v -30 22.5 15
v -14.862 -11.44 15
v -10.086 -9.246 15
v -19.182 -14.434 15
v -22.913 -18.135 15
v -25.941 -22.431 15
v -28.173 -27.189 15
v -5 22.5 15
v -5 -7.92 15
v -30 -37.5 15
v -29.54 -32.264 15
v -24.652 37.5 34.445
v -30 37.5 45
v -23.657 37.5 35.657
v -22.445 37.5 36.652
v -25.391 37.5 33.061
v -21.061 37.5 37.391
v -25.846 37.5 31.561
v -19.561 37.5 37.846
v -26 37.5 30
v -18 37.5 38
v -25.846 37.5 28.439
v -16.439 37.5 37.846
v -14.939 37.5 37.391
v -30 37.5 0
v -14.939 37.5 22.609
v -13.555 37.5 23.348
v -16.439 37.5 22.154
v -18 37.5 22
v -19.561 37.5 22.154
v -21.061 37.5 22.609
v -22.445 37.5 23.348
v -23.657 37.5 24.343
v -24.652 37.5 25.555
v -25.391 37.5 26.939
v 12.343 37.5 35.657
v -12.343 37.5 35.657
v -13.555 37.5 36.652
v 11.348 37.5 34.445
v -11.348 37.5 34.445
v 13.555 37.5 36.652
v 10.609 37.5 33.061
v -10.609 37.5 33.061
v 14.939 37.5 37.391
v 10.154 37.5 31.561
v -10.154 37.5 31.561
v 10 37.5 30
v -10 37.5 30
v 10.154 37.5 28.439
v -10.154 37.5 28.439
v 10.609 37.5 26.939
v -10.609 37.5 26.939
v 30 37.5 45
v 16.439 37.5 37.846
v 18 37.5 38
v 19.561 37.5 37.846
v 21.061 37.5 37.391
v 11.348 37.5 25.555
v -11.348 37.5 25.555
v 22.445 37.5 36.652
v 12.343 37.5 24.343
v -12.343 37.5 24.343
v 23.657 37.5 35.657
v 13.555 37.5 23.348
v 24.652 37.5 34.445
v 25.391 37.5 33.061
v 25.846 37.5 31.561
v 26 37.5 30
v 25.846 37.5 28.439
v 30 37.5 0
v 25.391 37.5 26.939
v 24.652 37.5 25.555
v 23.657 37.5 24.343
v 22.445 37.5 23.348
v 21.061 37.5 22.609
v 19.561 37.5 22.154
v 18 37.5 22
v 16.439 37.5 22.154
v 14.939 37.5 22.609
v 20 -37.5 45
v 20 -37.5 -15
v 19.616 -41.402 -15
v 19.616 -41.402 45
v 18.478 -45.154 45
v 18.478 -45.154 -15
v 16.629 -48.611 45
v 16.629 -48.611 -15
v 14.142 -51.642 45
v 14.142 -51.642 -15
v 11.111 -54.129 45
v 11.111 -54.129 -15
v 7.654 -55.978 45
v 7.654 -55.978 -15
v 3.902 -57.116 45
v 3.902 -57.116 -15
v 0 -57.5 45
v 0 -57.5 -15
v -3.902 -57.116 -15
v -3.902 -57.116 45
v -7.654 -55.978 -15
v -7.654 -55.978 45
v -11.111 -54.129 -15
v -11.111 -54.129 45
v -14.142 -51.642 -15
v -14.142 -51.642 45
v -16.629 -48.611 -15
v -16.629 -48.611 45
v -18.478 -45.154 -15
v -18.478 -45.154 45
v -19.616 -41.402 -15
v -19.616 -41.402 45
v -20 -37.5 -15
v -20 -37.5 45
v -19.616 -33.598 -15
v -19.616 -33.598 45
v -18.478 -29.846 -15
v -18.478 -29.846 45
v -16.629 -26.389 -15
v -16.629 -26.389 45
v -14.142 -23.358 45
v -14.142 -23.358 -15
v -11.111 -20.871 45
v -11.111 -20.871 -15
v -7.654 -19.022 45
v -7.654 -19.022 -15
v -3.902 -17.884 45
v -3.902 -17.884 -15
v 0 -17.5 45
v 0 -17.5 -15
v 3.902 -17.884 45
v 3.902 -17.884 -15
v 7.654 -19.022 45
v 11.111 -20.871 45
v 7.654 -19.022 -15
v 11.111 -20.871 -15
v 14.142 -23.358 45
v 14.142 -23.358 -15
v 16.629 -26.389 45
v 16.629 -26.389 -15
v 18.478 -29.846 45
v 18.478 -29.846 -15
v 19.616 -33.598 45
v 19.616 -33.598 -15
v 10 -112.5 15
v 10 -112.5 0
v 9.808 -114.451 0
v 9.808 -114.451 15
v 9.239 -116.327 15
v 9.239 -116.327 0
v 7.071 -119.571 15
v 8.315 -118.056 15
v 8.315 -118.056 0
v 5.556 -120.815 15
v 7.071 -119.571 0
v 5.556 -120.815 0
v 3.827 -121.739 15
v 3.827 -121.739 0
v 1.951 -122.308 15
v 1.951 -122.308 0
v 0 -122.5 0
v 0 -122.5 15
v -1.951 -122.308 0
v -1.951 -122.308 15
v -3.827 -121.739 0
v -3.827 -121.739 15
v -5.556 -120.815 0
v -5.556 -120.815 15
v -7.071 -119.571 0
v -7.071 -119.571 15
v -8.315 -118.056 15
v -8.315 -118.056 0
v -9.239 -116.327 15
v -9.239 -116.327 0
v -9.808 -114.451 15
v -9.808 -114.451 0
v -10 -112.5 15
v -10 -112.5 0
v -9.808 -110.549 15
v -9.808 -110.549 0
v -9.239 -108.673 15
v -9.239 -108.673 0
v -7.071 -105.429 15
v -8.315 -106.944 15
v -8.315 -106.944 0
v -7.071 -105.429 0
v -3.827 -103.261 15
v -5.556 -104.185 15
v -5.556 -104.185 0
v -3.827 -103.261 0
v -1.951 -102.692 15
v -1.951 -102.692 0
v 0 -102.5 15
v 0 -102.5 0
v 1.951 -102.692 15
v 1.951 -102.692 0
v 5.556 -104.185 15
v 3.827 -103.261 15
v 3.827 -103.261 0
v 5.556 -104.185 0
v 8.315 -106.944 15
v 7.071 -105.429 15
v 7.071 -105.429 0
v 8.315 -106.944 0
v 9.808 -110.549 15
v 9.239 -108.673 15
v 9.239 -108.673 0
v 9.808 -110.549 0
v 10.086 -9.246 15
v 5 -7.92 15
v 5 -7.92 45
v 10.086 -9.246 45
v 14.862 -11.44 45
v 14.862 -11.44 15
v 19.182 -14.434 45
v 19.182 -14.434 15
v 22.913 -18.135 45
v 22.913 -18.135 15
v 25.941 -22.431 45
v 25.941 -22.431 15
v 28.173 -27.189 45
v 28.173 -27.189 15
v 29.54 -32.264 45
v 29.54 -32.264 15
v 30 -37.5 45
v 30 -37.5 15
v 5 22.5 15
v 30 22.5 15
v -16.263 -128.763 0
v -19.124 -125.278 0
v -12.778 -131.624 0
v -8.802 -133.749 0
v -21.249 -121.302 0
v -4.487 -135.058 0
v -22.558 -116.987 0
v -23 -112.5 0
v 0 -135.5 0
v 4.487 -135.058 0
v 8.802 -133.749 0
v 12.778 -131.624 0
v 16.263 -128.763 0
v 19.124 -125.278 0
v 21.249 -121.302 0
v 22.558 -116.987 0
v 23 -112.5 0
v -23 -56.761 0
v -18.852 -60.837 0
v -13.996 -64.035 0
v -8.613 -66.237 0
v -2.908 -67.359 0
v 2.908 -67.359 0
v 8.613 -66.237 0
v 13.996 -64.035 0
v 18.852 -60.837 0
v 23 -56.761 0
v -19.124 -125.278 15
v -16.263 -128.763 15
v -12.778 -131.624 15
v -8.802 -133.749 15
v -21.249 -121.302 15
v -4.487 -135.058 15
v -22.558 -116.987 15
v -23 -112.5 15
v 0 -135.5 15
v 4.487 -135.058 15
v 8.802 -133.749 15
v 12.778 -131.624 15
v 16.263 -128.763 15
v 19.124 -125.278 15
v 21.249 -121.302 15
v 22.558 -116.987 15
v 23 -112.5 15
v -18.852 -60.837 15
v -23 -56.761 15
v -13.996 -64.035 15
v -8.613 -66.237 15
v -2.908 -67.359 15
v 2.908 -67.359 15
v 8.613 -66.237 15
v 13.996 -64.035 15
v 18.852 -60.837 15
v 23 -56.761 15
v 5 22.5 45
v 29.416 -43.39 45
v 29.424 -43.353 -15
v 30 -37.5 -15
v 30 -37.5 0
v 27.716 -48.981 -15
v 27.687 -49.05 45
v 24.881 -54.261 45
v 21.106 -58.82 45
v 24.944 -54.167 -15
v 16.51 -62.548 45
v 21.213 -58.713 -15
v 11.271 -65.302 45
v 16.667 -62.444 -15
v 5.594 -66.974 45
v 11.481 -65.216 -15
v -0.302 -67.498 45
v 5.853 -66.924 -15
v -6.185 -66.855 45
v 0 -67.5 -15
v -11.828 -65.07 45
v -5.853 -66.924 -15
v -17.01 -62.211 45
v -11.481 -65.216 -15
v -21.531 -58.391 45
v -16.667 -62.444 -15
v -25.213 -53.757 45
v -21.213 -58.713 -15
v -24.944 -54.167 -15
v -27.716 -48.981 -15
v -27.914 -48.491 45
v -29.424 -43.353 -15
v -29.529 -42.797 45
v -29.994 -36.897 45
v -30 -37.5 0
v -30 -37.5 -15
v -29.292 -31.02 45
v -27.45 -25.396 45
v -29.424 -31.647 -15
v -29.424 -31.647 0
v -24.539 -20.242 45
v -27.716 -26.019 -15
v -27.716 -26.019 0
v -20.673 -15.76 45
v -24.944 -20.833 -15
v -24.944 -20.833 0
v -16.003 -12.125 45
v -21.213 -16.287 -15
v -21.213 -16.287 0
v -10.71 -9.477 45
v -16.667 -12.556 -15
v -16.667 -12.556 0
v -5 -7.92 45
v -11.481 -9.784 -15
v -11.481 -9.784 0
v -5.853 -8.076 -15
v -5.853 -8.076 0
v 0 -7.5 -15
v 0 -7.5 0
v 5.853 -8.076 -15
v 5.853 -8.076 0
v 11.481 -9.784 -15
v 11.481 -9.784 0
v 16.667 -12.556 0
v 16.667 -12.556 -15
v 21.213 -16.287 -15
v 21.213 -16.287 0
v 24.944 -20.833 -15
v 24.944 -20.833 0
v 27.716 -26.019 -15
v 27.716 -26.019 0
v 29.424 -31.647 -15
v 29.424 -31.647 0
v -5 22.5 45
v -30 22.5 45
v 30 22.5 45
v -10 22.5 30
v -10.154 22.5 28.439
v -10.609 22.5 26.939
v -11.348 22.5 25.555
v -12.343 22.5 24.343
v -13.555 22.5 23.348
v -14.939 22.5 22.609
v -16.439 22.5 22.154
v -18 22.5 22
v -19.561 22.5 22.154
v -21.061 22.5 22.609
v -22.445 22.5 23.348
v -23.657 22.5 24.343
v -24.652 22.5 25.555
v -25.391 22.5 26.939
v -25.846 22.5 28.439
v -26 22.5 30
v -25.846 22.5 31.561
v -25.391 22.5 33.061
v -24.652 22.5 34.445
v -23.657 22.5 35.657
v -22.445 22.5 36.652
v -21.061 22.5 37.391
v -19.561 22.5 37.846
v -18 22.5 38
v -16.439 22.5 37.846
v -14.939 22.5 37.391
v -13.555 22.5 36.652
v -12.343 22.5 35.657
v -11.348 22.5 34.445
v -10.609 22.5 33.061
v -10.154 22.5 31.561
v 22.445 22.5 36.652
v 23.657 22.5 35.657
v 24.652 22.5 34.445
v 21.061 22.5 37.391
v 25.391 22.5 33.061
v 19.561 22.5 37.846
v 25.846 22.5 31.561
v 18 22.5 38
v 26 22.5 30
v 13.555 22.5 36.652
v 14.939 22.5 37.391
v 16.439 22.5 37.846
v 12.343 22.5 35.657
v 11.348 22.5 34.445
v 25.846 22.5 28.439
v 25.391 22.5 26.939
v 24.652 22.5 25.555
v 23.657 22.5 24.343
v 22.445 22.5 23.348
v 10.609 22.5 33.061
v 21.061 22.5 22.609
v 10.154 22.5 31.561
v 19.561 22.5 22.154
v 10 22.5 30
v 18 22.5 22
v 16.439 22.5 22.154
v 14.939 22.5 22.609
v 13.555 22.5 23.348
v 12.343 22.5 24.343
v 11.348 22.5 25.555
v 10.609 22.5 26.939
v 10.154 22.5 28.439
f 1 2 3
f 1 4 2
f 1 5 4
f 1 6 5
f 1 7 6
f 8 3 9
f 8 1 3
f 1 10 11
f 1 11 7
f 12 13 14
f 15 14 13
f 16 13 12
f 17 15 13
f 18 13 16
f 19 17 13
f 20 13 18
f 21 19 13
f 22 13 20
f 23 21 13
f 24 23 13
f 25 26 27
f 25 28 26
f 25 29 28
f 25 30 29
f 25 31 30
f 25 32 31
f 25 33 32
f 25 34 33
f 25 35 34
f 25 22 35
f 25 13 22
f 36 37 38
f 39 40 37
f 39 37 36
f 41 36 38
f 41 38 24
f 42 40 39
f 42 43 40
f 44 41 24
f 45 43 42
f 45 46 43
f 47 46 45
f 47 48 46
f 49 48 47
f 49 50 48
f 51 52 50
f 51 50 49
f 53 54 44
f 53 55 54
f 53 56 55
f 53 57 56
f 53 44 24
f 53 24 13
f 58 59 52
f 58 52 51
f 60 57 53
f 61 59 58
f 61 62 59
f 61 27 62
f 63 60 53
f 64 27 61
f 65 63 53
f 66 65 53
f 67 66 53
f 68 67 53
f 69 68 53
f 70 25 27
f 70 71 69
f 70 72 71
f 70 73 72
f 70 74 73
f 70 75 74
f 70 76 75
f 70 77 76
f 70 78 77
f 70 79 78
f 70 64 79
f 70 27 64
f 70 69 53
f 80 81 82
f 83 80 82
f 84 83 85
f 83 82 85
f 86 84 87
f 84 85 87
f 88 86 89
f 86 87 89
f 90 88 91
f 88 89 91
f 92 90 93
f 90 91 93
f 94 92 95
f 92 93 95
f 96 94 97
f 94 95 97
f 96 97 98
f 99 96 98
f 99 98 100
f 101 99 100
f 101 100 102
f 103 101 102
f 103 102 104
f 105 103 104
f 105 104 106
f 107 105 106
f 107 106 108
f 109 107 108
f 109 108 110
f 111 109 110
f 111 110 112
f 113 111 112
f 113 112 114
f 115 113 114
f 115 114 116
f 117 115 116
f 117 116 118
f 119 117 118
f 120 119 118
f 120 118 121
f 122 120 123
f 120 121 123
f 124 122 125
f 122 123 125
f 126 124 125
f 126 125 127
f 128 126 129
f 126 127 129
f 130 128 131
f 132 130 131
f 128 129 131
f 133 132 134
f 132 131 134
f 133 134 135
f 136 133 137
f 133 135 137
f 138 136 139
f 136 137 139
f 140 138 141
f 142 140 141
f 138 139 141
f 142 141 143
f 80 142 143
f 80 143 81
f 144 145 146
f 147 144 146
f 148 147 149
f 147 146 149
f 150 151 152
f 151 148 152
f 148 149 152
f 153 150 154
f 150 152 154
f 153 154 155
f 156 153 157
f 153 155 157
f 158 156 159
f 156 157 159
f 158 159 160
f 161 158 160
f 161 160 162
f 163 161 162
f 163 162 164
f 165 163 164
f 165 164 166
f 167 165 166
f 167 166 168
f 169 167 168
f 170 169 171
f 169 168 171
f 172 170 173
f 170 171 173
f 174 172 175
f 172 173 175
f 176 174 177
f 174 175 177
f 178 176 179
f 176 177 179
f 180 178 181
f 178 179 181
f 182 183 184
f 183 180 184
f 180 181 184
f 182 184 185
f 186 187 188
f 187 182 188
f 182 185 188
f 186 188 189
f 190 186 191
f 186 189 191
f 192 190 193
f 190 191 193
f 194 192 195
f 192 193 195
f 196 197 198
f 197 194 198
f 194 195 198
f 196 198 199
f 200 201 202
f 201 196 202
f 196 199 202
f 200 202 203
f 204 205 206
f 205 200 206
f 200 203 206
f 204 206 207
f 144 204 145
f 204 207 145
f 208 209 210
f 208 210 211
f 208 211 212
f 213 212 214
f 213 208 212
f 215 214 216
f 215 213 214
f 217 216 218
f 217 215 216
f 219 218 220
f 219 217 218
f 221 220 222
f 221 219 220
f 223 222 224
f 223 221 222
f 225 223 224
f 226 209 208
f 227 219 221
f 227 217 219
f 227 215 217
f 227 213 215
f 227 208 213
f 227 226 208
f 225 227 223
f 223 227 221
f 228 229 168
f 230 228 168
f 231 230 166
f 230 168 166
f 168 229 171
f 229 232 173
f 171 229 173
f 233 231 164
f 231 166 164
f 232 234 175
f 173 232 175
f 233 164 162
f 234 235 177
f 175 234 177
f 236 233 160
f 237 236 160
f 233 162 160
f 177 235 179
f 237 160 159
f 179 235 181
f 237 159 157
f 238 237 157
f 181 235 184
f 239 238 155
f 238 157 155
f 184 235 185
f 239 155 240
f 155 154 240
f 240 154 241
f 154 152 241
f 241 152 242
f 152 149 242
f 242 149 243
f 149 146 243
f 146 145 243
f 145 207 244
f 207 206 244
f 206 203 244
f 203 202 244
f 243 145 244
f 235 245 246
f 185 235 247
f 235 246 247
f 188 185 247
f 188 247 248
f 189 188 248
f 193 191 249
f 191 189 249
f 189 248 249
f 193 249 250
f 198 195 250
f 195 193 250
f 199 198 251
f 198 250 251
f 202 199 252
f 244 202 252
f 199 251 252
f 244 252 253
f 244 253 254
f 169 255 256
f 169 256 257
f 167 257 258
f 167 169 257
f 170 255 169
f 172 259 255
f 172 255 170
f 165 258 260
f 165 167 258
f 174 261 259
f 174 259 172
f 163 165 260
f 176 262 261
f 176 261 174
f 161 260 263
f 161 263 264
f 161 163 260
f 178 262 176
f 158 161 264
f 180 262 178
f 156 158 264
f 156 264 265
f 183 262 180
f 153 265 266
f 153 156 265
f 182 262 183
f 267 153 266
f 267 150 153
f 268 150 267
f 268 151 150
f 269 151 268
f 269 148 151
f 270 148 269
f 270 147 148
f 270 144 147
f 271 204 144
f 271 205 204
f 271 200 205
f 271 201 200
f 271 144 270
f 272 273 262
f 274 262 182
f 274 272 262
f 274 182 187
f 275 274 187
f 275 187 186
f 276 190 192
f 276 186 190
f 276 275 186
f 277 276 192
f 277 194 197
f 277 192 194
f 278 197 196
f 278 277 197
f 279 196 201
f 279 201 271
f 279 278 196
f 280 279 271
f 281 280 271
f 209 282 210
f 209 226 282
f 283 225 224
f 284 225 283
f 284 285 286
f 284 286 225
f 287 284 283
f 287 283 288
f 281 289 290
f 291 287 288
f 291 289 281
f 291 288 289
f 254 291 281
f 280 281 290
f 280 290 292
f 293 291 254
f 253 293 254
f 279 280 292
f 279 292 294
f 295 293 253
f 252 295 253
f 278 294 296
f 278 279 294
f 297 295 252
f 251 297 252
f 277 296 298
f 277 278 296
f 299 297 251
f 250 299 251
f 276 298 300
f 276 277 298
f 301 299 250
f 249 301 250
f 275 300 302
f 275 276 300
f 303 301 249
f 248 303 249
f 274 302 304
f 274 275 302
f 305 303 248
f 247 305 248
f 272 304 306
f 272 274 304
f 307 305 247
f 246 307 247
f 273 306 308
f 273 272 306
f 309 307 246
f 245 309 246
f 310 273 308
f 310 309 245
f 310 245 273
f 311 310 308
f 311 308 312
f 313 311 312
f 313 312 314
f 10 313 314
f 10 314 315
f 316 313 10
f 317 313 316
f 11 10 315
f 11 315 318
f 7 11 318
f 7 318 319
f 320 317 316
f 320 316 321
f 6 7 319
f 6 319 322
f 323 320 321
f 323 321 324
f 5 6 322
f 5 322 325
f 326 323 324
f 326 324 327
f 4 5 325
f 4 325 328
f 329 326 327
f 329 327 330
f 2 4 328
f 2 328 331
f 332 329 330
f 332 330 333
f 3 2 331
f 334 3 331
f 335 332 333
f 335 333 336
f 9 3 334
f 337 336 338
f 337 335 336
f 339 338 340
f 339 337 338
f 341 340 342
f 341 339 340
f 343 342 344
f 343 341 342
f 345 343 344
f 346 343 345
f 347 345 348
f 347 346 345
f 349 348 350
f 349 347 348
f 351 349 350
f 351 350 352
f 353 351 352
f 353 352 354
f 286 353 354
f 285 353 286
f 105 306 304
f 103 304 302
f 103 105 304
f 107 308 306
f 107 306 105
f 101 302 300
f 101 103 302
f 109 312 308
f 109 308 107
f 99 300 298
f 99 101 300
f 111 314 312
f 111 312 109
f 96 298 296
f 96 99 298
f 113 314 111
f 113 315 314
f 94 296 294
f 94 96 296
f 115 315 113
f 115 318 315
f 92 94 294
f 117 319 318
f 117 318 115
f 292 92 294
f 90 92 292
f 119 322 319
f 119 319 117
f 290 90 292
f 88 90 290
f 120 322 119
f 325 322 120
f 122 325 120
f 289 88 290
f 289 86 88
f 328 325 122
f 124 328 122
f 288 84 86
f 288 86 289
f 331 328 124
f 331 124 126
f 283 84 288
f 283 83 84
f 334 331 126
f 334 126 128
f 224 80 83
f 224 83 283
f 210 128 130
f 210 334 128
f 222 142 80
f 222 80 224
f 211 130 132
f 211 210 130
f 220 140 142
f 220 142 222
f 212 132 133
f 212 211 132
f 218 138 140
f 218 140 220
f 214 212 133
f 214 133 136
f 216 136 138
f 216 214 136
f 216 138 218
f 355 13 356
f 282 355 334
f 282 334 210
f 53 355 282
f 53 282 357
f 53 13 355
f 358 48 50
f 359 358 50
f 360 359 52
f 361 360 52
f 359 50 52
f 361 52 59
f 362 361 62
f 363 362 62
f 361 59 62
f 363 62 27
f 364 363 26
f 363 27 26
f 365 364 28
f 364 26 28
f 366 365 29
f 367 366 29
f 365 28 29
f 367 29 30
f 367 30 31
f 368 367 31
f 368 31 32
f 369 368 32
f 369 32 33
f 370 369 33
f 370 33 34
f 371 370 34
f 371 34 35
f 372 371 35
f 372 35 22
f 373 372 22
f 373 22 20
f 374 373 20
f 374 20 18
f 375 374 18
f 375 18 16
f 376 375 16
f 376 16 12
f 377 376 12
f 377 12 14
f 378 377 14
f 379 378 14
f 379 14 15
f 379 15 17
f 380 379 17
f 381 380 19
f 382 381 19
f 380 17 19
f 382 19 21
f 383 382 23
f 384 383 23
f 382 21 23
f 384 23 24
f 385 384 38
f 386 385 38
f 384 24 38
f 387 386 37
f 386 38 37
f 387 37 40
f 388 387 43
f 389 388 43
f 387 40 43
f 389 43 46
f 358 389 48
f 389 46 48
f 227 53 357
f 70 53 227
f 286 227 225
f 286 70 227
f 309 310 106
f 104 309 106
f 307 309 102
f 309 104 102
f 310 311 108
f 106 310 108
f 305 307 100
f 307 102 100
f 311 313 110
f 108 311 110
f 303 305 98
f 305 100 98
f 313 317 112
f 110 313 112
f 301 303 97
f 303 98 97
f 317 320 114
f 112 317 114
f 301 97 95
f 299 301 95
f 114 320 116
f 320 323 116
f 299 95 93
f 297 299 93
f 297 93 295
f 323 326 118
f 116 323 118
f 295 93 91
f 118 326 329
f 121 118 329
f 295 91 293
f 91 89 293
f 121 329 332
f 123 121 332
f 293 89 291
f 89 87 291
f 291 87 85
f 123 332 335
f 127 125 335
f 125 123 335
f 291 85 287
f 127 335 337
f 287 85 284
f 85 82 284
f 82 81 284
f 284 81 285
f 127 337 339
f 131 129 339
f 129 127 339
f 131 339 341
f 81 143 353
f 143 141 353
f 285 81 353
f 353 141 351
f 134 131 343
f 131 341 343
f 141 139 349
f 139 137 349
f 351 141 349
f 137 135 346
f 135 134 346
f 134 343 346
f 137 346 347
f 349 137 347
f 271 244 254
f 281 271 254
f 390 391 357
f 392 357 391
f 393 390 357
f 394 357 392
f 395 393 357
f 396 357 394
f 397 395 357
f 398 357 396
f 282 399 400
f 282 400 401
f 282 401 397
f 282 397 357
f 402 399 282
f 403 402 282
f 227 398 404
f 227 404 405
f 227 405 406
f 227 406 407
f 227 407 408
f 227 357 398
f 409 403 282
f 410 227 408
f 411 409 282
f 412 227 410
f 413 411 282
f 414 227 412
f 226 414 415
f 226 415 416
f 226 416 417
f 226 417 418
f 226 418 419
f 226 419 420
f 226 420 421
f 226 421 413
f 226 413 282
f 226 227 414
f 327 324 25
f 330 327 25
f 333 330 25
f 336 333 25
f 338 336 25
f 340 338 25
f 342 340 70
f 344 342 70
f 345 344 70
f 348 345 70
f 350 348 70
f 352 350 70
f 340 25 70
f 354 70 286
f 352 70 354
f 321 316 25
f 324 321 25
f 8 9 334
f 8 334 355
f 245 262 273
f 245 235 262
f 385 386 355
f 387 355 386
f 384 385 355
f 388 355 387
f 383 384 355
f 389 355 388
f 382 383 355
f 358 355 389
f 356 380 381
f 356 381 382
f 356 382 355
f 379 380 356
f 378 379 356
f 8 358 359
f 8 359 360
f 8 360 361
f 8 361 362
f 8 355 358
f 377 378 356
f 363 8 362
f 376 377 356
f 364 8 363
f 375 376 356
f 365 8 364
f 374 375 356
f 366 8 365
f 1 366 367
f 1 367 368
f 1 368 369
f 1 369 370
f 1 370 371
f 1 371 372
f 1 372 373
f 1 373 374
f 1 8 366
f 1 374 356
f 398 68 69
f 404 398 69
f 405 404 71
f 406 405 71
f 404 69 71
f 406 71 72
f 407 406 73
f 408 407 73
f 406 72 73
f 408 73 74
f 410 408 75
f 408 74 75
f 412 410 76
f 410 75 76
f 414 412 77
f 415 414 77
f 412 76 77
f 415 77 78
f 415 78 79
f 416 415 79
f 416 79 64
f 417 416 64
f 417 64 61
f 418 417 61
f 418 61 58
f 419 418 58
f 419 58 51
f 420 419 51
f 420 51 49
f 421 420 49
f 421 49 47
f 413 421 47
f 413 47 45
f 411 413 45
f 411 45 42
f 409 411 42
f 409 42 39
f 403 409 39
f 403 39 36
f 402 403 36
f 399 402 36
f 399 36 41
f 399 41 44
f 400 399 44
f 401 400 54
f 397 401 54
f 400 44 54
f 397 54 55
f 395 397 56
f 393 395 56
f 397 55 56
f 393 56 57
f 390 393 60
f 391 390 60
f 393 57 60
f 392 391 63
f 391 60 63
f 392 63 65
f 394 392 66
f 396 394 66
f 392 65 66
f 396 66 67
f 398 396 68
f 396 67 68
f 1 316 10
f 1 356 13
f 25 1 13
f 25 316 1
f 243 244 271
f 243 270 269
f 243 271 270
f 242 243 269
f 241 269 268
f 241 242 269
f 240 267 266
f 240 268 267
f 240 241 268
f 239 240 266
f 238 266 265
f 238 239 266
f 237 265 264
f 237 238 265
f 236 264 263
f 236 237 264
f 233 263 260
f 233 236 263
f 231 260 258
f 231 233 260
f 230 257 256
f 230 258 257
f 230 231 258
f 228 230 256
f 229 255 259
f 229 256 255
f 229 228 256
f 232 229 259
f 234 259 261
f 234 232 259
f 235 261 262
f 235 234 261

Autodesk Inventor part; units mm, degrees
ref_plane "YZ Plane" through (0, 0, 0) normal (1, 0, 0) x (0, 1, 0)
ref_plane "XZ Plane" through (0, 0, 0) normal (0, 1, 0) x (-1, 0, 0)
ref_plane "XY Plane" through (0, 0, 0) normal (0, 0, 1) x (1, 0, 0)
sketch "Sketch1" plane through (0, 0, 0) normal (0, 0, 1) x (1, 0, 0)
  line L0 (-30, 37.5) -> (30, 37.5)
  line L1 (30, 37.5) -> (30, -37.5)
  line L2 (30, -37.5) -> (-30, -37.5)
  line L3 (-30, -37.5) -> (-30, 37.5)
  line L4 (-30, 37.5) -> (30, -37.5) construction
  line L5 (30, 37.5) -> (-30, -37.5) construction
  circle A0 centre (0, -37.5) radius 30
  circle A1 centre (0, -37.5) radius 20
  circle A2 centre (0, -112.5) radius 23
  circle A3 centre (0, -112.5) radius 10
  line L6 (-23, -112.5) -> (-23, -56.7614)
  line L7 (23, -112.5) -> (23, -56.7614)
  line L8 (-30, 37.5) -> (30, 37.5)
  line L9 (30, 37.5) -> (30, 22.5)
  line L10 (30, 22.5) -> (-30, 22.5)
  line L11 (-30, 22.5) -> (-30, 37.5)
  line L12 (-5, 22.5) -> (5, 22.5)
  line L13 (5, 22.5) -> (5, -7.9196)
  line L14 (-5, -7.9196) -> (-5, 22.5)
  point P0 (0, 0)
  dimension "d0" = 60
  dimension "d1" = 75
  dimension "d2" = 60
  dimension "d3" = 40
  dimension "d4" = 46
  dimension "d5" = 20
  dimension "d6" = 75
  dimension "d7" = 15
  dimension "d9" = 25
extrude "Extrusion1" add sketch "Sketch1" along normal blind 15 contours L10 L14 A0 L3 | L1 A0 L13 L10 | A0 L7 A2 L6 | A2
extrude "Extrusion2" add sketch "Sketch1" along normal blind 45 contours L0 L1 L10 L3 | L10 L13 A0 L14
extrude "Extrusion3" add sketch "Sketch1" along normal blind 45 and the other way blind 15 contours A0 L2 A1 | L2 A1 A0
sketch "Sketch2" plane through (-30, 22.5, 15) normal (0, -1, 0) x (1, 0, 0)
  point P0 (30, -15)
sketch "Sketch3" plane through (-30, 22.5, 15) normal (0, -1, 0) x (1, 0, 0)
  point P0 (30, -15)
sketch "Sketch4" plane through (-30, 37.5, 0) normal (0, 1, 0) x (1, 0, 0)
  circle A0 centre (12, -30) radius 8
  line L0 (0, 0) -> (0, -45) projected
  line L1 (60, -45) -> (0, -45) projected
  circle A1 centre (48, -30) radius 8
  point P0 (30, 0)
  dimension "d18" = 16
  dimension "d19" = 12
  dimension "d20" = 15
extrude "Extrusion4" cut sketch "Sketch4" against normal blind 15
properties part number "cad@71"
